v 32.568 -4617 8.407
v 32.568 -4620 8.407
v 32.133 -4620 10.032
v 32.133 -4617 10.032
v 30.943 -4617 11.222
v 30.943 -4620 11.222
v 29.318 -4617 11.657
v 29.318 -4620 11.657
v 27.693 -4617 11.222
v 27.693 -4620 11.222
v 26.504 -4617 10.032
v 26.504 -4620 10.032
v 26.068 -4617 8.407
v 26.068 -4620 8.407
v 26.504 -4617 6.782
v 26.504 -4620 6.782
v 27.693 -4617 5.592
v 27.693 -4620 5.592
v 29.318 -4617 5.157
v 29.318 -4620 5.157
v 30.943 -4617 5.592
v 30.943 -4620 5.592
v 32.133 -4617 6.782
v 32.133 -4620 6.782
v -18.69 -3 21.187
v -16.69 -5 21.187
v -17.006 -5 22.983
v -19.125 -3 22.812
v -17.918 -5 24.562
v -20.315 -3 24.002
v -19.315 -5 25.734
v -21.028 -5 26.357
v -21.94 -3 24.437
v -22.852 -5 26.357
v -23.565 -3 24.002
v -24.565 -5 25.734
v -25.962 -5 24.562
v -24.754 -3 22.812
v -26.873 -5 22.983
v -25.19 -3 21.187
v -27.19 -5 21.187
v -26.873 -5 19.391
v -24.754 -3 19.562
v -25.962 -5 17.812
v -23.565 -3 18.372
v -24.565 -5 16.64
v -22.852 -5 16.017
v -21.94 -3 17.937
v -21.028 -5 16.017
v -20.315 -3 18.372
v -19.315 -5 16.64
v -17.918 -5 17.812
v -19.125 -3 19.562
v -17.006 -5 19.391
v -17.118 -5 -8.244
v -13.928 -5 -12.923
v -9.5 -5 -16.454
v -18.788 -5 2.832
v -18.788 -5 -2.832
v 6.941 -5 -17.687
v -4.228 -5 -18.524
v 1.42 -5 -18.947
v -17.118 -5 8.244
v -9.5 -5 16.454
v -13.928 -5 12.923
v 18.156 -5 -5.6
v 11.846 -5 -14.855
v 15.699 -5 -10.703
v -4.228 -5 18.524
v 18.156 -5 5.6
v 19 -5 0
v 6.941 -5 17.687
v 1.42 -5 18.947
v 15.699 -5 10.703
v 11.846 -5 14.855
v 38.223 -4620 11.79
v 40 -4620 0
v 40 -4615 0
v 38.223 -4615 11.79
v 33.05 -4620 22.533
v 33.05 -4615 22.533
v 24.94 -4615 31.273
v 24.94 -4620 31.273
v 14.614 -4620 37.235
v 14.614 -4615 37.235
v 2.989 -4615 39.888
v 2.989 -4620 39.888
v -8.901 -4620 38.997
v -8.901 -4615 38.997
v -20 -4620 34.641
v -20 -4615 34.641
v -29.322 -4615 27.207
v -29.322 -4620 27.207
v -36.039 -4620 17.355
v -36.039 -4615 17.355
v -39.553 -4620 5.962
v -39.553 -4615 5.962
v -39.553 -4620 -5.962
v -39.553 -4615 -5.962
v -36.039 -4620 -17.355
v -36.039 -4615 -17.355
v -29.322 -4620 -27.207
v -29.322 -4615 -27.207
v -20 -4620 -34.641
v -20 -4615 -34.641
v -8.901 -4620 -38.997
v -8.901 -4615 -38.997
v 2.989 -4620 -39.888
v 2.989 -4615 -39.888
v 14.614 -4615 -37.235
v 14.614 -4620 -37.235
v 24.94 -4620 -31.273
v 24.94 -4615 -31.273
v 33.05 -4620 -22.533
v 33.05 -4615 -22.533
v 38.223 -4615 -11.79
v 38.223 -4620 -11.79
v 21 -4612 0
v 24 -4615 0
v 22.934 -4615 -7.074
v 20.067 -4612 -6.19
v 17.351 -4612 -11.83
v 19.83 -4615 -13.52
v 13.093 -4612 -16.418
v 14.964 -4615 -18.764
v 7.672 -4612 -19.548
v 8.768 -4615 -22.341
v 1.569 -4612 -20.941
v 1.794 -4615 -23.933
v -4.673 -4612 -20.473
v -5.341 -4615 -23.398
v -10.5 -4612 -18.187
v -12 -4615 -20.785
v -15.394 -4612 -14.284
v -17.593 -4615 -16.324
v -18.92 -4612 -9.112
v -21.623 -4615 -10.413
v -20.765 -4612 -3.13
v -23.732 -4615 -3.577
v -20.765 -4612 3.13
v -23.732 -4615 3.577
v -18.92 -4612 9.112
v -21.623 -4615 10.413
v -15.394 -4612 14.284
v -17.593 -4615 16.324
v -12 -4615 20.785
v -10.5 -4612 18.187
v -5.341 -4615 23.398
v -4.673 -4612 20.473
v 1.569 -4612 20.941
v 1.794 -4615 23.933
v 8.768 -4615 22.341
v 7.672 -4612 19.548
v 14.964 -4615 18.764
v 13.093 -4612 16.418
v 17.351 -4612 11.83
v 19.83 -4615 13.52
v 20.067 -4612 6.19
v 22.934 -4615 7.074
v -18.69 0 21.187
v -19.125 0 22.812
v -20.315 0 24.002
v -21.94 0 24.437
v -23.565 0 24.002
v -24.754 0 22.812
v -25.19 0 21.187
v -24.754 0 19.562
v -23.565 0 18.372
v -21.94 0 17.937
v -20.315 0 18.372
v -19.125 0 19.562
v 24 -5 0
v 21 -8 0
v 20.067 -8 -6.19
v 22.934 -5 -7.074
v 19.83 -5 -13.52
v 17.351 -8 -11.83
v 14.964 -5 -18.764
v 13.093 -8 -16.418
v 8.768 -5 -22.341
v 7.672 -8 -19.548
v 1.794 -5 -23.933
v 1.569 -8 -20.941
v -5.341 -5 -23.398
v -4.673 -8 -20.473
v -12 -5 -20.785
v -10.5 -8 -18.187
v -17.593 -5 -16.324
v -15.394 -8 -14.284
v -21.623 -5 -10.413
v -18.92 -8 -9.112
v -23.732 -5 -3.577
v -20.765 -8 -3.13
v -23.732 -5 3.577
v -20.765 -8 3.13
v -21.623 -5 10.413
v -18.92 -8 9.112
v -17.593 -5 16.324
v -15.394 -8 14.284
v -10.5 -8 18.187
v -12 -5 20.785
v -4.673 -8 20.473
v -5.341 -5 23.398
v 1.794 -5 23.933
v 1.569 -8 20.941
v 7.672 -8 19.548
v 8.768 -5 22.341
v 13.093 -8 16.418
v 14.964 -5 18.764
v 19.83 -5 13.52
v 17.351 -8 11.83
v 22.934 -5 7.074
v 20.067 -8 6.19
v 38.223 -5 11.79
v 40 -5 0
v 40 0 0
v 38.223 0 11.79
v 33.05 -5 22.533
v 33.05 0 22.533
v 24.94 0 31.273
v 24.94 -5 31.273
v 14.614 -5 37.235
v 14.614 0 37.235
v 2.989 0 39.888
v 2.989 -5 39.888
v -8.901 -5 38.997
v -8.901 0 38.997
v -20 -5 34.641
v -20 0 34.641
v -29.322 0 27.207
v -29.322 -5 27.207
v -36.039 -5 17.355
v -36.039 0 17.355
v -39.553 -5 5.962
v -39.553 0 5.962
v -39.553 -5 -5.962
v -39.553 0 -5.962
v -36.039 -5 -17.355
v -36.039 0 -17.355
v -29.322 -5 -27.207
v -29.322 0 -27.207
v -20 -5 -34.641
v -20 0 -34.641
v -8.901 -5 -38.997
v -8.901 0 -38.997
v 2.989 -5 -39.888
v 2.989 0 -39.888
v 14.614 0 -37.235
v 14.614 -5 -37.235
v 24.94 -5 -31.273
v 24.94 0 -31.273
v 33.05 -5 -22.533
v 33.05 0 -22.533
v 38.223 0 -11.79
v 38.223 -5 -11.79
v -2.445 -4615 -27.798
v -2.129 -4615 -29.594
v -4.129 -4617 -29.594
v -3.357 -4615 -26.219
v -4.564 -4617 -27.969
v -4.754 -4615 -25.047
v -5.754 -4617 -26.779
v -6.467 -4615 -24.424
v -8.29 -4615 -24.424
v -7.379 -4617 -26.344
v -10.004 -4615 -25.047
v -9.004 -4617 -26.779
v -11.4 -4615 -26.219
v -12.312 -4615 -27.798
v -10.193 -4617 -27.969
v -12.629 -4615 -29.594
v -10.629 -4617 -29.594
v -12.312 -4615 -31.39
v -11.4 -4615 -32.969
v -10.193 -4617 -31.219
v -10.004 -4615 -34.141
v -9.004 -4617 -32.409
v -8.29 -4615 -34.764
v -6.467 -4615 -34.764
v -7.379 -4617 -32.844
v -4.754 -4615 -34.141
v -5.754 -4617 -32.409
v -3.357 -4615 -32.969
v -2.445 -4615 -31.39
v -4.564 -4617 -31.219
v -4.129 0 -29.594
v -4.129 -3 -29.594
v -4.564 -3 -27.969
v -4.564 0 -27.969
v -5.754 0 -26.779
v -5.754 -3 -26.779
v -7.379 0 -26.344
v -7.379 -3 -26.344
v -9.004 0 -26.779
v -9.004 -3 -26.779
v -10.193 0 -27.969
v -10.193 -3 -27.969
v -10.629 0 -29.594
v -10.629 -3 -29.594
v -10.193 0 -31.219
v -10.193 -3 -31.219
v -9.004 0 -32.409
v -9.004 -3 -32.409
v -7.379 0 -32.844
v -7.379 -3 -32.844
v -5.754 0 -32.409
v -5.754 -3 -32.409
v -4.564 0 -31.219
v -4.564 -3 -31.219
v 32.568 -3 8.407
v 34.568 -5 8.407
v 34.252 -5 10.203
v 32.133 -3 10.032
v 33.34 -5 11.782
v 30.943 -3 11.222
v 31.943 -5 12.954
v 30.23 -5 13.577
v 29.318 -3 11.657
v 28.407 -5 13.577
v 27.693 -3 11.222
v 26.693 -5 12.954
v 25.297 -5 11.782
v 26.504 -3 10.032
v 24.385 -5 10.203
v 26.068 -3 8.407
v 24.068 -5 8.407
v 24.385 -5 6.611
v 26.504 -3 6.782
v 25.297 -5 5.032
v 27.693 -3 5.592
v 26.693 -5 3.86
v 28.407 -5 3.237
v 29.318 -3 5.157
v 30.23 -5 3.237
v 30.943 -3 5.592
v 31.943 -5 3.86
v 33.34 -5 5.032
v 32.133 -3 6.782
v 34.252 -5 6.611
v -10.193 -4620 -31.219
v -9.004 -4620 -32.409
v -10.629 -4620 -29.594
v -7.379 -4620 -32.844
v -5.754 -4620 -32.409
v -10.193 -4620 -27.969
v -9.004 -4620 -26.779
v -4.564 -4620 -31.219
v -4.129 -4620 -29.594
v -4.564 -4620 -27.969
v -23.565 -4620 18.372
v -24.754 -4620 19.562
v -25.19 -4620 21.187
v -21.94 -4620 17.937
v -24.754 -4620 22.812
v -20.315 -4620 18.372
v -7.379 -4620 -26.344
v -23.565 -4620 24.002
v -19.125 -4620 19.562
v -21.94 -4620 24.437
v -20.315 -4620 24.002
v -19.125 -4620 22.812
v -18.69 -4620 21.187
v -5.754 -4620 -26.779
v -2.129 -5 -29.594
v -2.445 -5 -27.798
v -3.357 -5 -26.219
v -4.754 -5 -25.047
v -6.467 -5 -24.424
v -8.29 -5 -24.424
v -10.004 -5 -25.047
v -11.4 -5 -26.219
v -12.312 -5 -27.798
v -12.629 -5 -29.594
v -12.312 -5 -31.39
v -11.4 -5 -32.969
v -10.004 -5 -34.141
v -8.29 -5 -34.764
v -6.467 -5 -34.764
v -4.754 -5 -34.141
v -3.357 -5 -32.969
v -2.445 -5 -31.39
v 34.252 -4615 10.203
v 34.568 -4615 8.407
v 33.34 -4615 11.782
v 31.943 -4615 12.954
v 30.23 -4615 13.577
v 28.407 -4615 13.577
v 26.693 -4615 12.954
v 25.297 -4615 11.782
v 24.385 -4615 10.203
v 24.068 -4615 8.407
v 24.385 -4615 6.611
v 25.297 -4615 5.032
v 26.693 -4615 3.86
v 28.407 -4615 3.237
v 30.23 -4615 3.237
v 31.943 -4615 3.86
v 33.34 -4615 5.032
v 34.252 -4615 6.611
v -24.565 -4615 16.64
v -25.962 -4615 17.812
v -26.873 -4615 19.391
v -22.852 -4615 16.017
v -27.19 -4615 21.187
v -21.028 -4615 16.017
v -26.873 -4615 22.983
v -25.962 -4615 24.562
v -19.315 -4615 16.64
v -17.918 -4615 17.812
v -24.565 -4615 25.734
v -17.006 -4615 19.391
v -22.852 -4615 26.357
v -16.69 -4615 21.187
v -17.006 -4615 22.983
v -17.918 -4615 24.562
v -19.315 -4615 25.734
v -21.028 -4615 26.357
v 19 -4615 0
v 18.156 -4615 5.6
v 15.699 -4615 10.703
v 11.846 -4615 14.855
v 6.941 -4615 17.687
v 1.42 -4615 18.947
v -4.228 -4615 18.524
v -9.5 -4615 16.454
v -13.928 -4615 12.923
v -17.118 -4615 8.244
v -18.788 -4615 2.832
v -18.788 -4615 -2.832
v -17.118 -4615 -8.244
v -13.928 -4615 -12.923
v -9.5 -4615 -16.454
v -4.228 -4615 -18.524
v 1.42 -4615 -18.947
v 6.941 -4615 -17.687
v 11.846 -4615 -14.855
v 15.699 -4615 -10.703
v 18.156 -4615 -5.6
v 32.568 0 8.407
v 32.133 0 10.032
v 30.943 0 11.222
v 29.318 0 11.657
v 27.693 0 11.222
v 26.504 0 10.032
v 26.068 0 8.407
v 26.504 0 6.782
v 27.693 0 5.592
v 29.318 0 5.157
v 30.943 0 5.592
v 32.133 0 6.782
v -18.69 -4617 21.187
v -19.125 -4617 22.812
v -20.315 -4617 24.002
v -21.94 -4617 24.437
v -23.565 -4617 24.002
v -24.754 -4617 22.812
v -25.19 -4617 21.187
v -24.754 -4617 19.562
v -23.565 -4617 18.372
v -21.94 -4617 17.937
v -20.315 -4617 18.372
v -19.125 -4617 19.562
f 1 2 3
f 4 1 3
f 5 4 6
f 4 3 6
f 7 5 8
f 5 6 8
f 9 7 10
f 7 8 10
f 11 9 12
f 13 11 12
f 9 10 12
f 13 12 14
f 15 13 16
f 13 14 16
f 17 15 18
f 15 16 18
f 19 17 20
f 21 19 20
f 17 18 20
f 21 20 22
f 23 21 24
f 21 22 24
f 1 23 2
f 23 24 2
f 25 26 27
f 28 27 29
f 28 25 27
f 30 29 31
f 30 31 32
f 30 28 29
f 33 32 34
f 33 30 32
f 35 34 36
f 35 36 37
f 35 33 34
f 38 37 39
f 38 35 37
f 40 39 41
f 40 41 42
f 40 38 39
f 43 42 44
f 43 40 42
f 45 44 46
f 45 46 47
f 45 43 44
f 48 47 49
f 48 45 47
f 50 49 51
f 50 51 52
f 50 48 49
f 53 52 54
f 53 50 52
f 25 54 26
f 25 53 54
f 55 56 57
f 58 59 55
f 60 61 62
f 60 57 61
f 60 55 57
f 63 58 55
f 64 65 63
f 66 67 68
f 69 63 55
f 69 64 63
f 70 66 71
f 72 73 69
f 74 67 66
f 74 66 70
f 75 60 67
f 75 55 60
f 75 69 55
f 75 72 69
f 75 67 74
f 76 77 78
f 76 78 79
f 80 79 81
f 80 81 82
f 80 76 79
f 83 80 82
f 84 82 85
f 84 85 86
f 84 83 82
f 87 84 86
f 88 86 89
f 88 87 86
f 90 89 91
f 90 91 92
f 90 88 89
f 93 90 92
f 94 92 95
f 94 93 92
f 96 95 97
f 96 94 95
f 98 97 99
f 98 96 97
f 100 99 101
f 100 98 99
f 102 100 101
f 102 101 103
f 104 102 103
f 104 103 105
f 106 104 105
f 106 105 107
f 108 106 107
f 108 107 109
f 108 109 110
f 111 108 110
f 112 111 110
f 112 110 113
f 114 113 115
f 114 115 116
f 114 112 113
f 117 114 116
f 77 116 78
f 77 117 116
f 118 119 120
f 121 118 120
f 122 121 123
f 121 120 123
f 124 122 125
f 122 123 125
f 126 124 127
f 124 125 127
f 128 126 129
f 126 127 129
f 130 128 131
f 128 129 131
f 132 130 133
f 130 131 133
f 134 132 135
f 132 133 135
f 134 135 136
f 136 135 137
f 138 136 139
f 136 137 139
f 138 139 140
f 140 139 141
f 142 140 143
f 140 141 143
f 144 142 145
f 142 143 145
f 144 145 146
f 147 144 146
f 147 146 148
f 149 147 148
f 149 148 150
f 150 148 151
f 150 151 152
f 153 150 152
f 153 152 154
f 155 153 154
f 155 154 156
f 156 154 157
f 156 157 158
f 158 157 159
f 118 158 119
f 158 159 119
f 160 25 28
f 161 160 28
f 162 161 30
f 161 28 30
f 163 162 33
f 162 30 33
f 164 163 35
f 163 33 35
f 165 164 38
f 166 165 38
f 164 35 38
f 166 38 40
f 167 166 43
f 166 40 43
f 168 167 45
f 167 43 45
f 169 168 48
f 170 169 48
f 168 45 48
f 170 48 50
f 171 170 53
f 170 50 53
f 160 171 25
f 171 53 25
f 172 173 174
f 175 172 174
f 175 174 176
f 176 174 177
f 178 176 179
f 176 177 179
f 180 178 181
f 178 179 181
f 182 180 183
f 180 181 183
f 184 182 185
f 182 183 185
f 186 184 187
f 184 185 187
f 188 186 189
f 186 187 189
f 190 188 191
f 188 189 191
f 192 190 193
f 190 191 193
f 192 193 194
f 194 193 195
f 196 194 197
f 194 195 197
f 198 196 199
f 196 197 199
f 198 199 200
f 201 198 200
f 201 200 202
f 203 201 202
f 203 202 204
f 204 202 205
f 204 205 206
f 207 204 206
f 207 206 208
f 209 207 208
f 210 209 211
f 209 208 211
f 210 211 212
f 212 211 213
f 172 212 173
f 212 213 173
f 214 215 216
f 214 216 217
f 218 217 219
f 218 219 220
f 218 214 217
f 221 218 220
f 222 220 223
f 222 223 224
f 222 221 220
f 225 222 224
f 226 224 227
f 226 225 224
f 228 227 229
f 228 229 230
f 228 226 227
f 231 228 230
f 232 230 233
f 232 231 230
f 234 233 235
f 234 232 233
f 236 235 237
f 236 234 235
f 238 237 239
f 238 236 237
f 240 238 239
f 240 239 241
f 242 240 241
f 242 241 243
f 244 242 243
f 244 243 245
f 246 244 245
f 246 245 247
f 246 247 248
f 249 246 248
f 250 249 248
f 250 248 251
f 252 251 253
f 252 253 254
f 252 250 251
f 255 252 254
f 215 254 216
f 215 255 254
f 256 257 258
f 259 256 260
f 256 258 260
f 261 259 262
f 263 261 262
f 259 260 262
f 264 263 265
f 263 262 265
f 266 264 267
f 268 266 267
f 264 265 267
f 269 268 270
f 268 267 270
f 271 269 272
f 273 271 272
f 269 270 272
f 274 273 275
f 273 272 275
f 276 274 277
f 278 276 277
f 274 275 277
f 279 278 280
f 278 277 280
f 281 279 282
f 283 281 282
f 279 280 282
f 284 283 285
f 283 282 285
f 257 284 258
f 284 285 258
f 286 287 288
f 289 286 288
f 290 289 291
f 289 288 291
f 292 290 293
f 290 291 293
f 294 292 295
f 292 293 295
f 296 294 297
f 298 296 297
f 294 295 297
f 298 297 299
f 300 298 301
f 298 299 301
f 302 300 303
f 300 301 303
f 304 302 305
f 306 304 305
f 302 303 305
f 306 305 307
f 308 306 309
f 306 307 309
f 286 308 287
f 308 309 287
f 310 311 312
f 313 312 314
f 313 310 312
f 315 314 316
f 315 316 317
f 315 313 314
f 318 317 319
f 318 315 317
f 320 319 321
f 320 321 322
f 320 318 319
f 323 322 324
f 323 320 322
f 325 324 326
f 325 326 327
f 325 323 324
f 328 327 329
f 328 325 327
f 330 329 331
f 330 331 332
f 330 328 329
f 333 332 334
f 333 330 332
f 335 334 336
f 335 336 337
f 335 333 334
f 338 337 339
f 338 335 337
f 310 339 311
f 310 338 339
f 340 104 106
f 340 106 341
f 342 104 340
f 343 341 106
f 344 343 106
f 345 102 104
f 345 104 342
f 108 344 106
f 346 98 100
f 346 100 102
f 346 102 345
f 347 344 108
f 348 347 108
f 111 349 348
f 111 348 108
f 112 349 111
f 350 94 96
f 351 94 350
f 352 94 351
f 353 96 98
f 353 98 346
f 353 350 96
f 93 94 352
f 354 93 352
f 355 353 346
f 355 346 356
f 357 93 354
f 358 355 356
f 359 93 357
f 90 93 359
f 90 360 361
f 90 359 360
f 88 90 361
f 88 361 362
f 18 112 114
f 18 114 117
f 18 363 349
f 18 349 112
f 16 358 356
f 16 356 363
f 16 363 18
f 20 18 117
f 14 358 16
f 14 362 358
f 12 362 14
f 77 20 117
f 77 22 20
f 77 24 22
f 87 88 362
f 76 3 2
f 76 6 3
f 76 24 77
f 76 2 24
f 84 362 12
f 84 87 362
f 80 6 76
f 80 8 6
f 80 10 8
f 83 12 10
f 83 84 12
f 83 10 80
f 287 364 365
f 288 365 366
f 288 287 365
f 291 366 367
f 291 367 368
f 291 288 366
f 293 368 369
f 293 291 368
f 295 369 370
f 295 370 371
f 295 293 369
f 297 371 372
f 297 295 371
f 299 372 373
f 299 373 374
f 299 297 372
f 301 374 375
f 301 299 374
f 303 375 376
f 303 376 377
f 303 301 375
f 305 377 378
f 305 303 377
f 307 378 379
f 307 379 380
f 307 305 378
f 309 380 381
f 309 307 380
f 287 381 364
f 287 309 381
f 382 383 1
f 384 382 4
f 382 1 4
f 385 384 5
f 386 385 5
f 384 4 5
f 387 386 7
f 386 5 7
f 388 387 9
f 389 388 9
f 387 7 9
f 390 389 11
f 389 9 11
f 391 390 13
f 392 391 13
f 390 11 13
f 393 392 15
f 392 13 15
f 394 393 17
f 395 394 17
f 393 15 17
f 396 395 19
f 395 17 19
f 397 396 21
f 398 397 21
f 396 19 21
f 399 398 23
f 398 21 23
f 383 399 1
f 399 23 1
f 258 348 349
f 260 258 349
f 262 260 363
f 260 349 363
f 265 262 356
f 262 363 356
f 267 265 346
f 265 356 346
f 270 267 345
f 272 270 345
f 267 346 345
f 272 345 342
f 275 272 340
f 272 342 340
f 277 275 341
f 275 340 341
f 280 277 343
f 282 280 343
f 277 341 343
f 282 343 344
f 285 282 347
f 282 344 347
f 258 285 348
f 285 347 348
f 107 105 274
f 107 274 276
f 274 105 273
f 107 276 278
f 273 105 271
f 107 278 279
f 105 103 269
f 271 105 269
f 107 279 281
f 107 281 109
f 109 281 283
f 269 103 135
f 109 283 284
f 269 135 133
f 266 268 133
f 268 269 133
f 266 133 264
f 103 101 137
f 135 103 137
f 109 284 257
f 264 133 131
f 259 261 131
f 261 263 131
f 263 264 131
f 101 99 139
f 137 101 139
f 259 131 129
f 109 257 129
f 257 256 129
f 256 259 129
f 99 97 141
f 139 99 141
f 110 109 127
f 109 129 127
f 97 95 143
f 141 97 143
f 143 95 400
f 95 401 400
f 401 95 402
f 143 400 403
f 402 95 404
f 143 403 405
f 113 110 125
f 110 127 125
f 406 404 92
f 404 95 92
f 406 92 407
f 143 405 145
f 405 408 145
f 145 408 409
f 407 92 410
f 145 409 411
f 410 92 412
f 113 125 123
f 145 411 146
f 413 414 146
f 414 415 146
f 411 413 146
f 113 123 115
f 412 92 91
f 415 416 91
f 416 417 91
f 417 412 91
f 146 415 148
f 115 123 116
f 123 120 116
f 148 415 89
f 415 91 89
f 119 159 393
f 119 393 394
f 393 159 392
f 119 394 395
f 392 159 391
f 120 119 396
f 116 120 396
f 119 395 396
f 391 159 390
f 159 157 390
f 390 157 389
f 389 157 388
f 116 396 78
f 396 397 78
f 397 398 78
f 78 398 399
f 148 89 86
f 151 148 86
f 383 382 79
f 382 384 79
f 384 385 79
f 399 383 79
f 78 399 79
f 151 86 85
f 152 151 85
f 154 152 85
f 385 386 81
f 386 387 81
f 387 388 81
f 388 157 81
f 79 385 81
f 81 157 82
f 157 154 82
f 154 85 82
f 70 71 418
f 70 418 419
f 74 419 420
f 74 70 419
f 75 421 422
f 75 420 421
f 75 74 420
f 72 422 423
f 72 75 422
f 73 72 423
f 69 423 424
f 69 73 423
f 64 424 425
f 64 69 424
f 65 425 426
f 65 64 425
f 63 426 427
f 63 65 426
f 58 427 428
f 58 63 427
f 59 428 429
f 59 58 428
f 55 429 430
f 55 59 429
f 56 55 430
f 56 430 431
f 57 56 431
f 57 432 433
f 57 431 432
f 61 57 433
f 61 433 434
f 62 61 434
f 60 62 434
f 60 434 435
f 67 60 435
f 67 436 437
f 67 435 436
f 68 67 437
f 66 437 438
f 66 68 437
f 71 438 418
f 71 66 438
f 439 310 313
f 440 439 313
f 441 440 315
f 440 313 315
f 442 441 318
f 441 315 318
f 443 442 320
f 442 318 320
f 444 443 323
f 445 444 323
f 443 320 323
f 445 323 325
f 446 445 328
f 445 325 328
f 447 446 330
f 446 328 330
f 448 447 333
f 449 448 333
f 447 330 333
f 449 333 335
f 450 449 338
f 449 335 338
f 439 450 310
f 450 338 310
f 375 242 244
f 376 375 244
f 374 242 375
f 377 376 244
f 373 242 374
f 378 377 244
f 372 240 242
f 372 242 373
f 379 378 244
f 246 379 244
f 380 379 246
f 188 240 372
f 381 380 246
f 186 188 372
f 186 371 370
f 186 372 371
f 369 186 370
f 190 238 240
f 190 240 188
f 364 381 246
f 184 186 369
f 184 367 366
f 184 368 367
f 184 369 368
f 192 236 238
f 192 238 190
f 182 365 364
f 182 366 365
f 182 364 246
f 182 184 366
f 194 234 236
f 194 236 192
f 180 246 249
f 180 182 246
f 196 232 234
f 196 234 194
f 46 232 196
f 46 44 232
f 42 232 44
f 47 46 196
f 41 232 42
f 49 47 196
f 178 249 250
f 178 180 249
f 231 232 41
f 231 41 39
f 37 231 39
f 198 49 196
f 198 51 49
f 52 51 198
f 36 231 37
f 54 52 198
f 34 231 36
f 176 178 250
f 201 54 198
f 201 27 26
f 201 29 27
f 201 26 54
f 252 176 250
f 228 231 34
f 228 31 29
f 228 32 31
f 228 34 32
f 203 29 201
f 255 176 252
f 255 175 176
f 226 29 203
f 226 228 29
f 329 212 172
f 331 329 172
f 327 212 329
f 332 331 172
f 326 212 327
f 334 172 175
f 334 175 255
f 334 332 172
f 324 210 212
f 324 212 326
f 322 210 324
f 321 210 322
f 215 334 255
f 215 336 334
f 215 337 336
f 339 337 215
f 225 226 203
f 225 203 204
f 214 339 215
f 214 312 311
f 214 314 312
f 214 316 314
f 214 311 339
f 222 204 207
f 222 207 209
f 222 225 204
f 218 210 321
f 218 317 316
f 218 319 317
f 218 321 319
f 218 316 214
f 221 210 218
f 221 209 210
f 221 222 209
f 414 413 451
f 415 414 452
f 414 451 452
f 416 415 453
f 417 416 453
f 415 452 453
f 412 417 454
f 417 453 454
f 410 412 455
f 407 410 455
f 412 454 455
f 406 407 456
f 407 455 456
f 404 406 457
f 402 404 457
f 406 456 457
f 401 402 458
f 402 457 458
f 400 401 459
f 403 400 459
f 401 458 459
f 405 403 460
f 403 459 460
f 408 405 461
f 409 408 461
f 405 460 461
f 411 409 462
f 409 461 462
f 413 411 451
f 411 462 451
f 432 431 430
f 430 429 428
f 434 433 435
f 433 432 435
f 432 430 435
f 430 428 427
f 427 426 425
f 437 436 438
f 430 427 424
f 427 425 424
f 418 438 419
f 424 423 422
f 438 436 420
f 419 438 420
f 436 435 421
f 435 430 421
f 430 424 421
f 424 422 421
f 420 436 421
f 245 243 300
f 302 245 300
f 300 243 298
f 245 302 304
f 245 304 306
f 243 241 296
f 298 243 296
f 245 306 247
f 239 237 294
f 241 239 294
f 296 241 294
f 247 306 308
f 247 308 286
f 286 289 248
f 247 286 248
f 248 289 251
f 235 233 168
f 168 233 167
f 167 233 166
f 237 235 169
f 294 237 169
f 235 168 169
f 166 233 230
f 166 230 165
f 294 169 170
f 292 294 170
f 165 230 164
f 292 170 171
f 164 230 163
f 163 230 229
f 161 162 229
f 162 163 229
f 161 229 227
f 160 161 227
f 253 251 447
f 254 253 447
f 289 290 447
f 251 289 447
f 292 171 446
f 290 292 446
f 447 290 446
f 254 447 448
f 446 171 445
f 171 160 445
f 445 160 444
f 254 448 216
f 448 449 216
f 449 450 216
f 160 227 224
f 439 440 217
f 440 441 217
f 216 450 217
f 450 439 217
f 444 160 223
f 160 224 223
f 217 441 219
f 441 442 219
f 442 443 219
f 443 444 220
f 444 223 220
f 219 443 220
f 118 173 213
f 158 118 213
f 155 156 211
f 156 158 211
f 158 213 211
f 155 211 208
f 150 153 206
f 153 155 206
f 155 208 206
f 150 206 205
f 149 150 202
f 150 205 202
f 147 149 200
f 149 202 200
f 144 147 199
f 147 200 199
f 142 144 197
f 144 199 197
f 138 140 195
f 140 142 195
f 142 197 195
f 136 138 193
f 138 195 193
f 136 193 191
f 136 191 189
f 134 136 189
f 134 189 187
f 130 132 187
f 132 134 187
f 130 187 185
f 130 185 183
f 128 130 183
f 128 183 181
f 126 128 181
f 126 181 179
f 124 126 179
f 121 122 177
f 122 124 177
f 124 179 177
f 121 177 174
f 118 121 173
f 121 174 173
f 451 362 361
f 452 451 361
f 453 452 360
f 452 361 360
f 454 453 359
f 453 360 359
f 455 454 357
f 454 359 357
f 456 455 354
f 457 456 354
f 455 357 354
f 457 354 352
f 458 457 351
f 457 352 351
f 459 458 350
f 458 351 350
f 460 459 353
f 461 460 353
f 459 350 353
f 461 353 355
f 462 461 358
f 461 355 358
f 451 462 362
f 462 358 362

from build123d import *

# Parameters (mm, degrees)
F2_R     = 21
F2_R_2   = 19
F3_DEPTH = 4620
F4_R     = 40
F4_R_2   = 3.25
F4_R_3   = 21
F4_R_4   = 19
F5_DEPTH = 5
F6_START = -4615
F6_DEPTH = 5
F7_SIZE  = 2
F8_SIZE  = 3


with BuildPart() as f3:
    # F2 (on Front) → F3 (new body)
    with BuildSketch(Plane.XZ):
        Circle(F2_R)
        Circle(F2_R_2, mode=Mode.SUBTRACT)
    extrude(amount=F3_DEPTH)

    # F4 (on face) → F5 (join)
    with BuildSketch(Plane.XZ.offset(4620)):
        Circle(F4_R)
        with Locations((-7.3786178158, -29.5940196514)):
            Circle(F4_R_2, mode=Mode.SUBTRACT)
        with Locations((-21.9398639103, 21.187080299)):
            Circle(F4_R_2, mode=Mode.SUBTRACT)
        Circle(F4_R_3, mode=Mode.SUBTRACT)
        with Locations((29.3184817261, 8.4069393524)):
            Circle(F4_R_2, mode=Mode.SUBTRACT)
        Circle(F4_R_3)
        Circle(F4_R_4, mode=Mode.SUBTRACT)
        Circle(F4_R_4)
    extrude(amount=-F5_DEPTH)

    # F4 (on face) → F6 (join)
    with BuildSketch(Plane.XZ.offset(4620).offset(F6_START)):
        Circle(F4_R)
        with Locations((-7.3786178158, -29.5940196514)):
            Circle(F4_R_2, mode=Mode.SUBTRACT)
        with Locations((-21.9398639103, 21.187080299)):
            Circle(F4_R_2, mode=Mode.SUBTRACT)
        with Locations((29.3184817261, 8.4069393524)):
            Circle(F4_R_2, mode=Mode.SUBTRACT)
    extrude(amount=-F6_DEPTH)

    # F7
    f7_edges = [f3.edges().sort_by_distance(p)[0] for p in [
        (26.068482, -4615, 8.406939),
        (-25.189864, -4615, 21.18708),
        (-10.628618, -4615, -29.59402),
        (-10.628618, -5, -29.59402),
        (26.068482, -5, 8.406939),
        (-25.189864, -5, 21.18708),
    ]]
    chamfer(f7_edges, length=F7_SIZE)

    # F8
    f8_edges = [f3.edges().sort_by_distance(p)[0] for p in [
        (-21, -5, 0),
        (-21, -4615, 0),
    ]]
    chamfer(f8_edges, length=F8_SIZE)


solid = f3.part
